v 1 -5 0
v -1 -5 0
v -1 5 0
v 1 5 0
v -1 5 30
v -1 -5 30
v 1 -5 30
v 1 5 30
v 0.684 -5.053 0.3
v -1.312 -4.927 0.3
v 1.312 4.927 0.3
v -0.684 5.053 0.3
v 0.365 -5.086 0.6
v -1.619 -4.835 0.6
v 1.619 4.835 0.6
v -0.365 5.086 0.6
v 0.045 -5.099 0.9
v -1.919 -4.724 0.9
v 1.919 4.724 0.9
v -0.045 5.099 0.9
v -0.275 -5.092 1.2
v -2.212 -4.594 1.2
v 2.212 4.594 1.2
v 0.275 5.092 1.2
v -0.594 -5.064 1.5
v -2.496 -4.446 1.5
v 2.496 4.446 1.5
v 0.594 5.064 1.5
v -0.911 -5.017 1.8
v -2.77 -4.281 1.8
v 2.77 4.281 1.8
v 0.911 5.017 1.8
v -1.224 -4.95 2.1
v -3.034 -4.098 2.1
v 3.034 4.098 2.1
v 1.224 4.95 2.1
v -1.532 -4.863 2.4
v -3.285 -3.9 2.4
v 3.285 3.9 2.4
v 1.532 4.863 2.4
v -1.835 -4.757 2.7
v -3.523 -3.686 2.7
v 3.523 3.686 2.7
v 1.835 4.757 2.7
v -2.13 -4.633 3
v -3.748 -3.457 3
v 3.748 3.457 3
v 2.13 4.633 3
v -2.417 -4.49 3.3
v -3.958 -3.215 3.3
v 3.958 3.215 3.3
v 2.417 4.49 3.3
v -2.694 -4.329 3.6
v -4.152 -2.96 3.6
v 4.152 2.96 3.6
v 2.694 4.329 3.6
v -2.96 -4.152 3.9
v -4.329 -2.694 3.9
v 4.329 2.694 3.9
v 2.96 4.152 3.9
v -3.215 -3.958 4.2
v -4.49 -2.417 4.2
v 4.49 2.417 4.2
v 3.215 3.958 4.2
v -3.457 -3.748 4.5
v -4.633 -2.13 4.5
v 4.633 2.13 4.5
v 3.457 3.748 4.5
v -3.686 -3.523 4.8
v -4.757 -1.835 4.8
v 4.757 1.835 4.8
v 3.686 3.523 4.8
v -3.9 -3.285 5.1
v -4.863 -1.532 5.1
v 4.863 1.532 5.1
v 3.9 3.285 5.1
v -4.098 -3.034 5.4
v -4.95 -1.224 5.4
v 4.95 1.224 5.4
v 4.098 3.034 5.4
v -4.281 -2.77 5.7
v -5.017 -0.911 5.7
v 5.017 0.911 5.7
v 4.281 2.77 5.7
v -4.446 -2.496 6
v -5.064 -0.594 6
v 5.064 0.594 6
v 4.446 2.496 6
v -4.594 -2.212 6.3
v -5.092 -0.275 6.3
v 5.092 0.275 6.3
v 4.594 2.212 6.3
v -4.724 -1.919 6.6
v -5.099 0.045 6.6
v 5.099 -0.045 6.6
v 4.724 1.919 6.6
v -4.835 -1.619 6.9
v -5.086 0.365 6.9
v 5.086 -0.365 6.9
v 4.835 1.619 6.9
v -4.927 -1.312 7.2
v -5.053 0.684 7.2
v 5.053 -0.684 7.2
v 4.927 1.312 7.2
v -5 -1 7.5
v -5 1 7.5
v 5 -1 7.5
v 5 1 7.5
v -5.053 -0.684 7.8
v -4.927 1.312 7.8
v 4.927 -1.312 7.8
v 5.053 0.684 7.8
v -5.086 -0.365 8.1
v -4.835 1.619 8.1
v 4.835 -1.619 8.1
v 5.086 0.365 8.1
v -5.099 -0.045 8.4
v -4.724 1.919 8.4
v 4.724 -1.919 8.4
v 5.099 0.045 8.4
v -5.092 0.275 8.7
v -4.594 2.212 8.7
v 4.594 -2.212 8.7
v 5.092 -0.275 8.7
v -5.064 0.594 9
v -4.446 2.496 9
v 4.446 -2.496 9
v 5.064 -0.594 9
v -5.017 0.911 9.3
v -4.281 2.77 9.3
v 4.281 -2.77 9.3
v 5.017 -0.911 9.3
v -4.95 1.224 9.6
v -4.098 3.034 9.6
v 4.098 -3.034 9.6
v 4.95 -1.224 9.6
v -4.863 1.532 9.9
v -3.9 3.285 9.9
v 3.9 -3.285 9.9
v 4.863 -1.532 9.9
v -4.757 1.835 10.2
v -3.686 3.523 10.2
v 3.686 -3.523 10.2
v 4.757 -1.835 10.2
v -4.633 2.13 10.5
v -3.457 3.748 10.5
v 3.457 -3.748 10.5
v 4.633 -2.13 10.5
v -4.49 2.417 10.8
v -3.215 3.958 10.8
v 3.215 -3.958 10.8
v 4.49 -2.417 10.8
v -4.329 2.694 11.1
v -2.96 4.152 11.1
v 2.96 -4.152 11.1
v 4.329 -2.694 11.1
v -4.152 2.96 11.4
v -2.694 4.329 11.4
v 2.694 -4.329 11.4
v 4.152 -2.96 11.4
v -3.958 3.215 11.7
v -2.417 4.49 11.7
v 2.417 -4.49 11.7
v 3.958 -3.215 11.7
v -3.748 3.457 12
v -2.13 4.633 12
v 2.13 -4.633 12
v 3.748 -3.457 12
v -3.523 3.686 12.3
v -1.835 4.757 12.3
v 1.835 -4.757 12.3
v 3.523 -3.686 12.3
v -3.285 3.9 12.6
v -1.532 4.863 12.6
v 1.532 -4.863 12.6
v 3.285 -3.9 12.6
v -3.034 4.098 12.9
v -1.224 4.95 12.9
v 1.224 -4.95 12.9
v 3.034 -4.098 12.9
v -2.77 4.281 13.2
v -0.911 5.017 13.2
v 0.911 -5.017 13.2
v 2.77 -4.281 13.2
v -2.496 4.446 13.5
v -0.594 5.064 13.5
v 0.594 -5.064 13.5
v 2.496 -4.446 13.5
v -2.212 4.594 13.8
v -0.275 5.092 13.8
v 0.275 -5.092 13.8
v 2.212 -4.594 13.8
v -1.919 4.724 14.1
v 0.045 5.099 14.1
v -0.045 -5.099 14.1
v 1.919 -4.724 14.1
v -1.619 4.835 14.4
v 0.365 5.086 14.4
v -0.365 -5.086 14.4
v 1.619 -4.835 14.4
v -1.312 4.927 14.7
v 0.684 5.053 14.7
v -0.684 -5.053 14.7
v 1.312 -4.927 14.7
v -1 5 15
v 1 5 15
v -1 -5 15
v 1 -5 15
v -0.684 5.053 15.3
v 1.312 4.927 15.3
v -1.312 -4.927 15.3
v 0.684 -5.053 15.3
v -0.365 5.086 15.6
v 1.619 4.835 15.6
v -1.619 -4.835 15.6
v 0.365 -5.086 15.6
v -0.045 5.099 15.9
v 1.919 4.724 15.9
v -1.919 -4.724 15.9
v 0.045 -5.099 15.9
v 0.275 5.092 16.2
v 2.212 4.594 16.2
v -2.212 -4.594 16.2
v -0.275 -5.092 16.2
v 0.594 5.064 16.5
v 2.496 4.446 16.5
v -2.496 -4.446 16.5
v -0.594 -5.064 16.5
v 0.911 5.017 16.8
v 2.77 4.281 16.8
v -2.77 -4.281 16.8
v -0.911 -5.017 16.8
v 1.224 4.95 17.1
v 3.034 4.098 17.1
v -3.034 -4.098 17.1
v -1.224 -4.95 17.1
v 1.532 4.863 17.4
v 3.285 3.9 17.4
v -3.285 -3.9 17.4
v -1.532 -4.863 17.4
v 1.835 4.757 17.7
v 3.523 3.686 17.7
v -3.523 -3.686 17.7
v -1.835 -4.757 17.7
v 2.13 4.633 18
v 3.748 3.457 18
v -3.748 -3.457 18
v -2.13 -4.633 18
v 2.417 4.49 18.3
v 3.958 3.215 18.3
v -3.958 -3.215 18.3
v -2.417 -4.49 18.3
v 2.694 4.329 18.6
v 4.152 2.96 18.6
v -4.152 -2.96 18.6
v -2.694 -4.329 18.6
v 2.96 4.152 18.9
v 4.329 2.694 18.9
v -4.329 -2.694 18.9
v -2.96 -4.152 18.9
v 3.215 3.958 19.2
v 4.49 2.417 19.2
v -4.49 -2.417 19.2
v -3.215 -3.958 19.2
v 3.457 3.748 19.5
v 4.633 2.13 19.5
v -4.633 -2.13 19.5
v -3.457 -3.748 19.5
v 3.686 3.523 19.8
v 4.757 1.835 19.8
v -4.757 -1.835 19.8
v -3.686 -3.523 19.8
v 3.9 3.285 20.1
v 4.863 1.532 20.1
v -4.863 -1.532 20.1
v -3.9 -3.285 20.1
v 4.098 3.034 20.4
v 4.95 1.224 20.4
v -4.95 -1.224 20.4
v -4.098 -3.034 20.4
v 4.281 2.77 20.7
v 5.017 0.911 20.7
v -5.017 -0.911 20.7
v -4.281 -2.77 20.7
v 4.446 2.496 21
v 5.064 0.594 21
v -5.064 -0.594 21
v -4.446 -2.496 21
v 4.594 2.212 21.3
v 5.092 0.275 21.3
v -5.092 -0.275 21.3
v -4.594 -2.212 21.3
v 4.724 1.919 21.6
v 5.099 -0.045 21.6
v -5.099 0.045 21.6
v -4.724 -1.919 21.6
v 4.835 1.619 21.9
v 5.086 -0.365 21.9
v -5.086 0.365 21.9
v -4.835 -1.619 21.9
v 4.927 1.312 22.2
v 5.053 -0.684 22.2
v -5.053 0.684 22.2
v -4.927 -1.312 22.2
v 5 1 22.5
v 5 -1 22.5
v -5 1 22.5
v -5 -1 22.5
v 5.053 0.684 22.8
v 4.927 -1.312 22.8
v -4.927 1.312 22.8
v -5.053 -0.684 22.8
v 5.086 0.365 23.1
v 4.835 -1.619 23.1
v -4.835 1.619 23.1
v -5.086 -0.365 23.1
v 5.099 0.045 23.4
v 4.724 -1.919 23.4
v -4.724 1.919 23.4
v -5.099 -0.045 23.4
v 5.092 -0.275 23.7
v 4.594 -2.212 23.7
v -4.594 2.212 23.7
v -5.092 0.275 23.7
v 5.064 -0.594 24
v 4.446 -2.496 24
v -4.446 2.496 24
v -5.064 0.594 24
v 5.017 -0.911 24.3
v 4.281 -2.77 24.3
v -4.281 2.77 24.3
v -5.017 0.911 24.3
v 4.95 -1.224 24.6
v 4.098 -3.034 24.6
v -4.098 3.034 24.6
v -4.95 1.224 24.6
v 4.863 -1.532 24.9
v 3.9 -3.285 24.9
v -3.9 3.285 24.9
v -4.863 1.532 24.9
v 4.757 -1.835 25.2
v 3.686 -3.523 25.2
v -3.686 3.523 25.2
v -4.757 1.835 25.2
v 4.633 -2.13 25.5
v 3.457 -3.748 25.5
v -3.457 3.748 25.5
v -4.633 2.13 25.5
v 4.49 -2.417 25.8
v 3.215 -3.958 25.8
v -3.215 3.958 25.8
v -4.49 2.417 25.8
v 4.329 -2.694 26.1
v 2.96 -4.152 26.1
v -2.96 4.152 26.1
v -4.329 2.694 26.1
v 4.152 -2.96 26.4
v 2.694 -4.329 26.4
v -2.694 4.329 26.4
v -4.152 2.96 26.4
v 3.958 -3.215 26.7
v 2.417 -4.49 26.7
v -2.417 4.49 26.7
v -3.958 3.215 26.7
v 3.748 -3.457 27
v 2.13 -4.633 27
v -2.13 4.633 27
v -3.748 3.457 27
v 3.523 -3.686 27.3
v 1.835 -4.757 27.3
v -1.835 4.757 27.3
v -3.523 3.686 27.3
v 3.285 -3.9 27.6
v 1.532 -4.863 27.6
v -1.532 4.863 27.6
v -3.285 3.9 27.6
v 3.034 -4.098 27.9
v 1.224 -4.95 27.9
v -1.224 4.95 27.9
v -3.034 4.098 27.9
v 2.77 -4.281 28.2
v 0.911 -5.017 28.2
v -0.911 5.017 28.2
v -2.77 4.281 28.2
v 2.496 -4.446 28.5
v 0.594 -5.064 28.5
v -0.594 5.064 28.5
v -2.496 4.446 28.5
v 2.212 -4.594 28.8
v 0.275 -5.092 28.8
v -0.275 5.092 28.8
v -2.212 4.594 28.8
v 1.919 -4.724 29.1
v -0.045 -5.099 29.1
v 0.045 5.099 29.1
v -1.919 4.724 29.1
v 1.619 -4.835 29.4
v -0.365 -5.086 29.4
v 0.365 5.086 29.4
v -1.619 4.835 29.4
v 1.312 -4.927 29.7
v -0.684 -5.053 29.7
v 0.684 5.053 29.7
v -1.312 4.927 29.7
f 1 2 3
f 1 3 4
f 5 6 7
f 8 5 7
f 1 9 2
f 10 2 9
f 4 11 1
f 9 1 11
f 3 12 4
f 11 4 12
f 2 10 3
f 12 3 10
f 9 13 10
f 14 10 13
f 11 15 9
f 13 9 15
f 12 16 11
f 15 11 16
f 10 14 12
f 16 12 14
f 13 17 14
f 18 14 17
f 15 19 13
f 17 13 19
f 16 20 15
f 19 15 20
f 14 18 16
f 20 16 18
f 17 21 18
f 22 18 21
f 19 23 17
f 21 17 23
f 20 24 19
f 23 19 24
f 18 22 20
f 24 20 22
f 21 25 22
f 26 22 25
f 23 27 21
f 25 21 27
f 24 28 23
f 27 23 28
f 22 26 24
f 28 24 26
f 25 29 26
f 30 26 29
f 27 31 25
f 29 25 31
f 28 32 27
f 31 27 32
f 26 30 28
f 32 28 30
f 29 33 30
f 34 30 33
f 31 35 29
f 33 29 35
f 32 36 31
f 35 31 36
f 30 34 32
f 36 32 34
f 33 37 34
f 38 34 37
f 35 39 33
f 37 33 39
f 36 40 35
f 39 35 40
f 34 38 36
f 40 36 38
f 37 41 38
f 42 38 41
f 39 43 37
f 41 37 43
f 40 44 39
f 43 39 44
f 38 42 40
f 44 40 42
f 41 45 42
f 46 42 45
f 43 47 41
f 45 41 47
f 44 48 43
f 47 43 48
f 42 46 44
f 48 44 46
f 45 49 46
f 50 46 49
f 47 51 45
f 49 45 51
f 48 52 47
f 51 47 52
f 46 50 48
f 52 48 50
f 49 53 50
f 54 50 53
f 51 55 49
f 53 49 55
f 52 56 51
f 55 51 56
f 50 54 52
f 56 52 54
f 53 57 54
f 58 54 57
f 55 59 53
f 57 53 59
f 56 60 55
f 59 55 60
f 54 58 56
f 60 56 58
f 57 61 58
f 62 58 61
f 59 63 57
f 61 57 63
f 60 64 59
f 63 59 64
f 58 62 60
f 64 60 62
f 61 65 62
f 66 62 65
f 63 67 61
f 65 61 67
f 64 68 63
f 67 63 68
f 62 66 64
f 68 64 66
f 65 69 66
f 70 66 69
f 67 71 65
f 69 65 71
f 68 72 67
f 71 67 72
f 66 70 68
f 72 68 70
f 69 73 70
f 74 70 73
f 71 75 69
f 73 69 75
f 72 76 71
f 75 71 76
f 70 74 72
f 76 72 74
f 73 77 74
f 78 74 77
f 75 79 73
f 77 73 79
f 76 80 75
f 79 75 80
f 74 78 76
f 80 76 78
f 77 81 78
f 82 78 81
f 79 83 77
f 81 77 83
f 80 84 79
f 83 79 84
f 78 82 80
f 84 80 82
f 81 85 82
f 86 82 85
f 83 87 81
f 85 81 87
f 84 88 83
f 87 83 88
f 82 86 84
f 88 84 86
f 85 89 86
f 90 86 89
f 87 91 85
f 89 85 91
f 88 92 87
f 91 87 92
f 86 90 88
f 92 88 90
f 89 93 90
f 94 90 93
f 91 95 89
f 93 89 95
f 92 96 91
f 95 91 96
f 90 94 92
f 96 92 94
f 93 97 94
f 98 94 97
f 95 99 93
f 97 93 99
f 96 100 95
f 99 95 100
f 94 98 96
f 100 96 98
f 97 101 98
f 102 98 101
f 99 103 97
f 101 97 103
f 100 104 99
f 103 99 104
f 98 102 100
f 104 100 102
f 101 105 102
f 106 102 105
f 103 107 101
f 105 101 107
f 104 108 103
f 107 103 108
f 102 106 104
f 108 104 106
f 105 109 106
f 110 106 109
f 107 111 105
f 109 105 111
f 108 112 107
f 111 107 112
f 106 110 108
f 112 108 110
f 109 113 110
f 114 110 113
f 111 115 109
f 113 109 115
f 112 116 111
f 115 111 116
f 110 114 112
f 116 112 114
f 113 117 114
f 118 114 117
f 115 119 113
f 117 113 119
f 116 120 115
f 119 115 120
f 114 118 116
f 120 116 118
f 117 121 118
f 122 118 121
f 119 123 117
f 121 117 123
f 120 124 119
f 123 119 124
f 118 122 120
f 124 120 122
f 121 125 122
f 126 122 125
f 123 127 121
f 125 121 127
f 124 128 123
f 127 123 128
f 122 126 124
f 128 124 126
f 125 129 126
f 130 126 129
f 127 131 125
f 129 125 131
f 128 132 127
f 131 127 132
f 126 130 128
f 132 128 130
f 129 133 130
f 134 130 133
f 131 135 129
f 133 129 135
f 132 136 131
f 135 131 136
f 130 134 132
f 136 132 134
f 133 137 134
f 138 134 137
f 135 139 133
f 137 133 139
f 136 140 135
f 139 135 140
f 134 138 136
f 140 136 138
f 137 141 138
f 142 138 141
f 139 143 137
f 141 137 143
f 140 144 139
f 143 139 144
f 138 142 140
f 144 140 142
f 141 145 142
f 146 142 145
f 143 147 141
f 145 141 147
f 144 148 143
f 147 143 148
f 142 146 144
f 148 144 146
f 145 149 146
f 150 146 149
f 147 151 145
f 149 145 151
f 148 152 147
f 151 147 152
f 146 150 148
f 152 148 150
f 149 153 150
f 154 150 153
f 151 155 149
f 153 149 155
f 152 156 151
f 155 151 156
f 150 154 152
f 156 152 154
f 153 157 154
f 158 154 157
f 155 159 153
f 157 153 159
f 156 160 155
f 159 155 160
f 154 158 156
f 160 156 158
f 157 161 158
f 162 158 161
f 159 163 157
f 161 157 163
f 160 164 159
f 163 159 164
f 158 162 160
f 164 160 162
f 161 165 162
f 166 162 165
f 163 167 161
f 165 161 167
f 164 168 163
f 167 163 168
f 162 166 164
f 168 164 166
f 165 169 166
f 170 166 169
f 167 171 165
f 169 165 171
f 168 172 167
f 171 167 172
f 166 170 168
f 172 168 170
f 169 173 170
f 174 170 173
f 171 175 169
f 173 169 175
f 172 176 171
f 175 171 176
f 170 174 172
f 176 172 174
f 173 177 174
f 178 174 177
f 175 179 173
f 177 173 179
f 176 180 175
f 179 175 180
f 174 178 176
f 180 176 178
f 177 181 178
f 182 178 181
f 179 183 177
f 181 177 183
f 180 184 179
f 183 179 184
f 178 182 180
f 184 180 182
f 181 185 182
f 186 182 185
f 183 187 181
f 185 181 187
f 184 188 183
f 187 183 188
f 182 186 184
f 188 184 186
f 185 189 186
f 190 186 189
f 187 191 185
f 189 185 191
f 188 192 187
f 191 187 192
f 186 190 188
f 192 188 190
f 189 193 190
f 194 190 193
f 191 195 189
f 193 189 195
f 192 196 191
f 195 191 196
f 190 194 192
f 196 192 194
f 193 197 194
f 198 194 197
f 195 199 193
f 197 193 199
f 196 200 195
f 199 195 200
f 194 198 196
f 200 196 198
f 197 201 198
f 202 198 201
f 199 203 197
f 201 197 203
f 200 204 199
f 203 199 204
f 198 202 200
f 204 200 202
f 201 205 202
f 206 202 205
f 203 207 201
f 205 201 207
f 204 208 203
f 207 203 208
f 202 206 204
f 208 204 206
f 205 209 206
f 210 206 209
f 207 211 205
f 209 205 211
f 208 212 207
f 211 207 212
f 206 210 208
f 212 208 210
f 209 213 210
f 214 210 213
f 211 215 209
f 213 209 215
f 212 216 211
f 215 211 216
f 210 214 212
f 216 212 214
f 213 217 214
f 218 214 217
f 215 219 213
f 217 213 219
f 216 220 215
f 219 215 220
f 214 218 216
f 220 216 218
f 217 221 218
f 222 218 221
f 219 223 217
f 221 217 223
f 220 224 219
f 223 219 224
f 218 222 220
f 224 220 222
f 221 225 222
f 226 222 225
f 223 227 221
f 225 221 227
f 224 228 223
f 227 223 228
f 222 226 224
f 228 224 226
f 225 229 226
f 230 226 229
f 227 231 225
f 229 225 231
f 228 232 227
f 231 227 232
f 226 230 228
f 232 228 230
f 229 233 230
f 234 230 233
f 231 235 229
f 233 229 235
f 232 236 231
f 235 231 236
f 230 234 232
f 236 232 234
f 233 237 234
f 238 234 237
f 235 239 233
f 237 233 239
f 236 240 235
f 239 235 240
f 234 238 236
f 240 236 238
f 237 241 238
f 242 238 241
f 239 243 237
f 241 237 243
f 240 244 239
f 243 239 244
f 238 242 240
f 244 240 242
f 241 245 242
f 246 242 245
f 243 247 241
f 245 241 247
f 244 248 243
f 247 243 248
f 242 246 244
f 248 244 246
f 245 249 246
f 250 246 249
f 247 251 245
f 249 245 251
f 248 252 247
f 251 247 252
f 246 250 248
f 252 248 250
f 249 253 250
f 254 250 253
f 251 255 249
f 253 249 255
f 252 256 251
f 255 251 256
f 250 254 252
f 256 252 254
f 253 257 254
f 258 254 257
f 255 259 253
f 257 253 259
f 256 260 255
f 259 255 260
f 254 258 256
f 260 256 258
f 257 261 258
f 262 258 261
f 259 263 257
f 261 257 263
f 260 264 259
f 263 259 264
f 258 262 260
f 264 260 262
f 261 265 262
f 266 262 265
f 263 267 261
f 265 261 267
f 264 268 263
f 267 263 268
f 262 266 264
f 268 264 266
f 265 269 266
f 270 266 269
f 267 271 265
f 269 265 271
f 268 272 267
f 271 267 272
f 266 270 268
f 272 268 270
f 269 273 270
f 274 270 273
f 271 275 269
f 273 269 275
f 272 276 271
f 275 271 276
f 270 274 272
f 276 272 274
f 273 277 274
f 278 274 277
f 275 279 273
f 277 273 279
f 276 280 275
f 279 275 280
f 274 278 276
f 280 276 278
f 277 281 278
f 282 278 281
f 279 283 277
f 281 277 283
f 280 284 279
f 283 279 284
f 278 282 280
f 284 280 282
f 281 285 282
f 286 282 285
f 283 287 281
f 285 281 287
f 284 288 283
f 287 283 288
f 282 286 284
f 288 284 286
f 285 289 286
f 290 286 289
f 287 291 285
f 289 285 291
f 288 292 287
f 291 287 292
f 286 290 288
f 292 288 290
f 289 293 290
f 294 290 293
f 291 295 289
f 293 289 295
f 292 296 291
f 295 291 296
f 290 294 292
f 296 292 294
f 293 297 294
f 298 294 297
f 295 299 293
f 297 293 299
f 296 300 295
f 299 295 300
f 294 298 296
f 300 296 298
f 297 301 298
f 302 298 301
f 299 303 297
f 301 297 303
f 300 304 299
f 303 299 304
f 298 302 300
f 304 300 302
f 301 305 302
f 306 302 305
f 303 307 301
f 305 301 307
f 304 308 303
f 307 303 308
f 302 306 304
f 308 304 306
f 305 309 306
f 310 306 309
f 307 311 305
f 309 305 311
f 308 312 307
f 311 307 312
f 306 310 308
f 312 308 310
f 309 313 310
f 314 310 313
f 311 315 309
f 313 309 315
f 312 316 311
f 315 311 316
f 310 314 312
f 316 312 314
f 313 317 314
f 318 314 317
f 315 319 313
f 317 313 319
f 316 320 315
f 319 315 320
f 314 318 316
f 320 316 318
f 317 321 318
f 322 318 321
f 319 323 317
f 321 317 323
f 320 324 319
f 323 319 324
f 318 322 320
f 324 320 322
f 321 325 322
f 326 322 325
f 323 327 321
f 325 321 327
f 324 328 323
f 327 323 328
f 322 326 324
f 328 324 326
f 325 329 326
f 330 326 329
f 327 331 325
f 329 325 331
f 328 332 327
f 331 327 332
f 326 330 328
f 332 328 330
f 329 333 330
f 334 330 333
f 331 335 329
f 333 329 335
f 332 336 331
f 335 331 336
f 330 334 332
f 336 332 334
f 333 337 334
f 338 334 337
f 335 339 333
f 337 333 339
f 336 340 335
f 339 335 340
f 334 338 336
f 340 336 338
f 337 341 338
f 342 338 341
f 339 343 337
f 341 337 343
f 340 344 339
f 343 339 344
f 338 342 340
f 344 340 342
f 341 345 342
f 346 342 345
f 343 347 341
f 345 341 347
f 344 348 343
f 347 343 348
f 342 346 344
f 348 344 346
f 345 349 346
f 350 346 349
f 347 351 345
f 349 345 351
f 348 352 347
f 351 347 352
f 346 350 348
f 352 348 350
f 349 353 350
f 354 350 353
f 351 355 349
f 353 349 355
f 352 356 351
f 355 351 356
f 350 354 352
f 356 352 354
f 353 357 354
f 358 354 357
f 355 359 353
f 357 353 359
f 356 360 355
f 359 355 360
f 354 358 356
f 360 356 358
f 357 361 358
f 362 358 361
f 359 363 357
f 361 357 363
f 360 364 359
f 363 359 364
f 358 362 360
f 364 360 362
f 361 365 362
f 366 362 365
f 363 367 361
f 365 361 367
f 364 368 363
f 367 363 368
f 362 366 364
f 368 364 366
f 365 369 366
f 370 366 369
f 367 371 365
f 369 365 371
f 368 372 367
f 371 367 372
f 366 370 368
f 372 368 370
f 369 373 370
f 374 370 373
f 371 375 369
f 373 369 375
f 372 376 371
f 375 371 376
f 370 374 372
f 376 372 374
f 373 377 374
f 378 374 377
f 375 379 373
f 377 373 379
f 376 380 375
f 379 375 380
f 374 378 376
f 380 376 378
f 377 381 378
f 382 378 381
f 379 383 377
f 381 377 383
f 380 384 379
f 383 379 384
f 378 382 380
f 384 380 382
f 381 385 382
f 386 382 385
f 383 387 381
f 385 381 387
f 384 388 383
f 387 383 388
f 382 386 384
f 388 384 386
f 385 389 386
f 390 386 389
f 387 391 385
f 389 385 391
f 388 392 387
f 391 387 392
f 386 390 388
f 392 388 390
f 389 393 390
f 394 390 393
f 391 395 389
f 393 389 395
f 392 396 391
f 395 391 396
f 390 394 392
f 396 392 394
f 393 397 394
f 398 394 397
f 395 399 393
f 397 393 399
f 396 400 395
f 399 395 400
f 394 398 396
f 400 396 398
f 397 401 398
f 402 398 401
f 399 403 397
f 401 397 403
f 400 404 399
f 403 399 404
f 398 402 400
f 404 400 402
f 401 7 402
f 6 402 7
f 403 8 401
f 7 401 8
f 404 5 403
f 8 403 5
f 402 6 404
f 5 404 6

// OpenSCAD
//linear_extrude(height = fanwidth, center = true, convexity = 10, twist = -fanrot, slices = 20, scale = 1.0)
linear_extrude(height = 30, center=false, twist=360, slices=100, convexity=10)
   square([2,10], center=true);
